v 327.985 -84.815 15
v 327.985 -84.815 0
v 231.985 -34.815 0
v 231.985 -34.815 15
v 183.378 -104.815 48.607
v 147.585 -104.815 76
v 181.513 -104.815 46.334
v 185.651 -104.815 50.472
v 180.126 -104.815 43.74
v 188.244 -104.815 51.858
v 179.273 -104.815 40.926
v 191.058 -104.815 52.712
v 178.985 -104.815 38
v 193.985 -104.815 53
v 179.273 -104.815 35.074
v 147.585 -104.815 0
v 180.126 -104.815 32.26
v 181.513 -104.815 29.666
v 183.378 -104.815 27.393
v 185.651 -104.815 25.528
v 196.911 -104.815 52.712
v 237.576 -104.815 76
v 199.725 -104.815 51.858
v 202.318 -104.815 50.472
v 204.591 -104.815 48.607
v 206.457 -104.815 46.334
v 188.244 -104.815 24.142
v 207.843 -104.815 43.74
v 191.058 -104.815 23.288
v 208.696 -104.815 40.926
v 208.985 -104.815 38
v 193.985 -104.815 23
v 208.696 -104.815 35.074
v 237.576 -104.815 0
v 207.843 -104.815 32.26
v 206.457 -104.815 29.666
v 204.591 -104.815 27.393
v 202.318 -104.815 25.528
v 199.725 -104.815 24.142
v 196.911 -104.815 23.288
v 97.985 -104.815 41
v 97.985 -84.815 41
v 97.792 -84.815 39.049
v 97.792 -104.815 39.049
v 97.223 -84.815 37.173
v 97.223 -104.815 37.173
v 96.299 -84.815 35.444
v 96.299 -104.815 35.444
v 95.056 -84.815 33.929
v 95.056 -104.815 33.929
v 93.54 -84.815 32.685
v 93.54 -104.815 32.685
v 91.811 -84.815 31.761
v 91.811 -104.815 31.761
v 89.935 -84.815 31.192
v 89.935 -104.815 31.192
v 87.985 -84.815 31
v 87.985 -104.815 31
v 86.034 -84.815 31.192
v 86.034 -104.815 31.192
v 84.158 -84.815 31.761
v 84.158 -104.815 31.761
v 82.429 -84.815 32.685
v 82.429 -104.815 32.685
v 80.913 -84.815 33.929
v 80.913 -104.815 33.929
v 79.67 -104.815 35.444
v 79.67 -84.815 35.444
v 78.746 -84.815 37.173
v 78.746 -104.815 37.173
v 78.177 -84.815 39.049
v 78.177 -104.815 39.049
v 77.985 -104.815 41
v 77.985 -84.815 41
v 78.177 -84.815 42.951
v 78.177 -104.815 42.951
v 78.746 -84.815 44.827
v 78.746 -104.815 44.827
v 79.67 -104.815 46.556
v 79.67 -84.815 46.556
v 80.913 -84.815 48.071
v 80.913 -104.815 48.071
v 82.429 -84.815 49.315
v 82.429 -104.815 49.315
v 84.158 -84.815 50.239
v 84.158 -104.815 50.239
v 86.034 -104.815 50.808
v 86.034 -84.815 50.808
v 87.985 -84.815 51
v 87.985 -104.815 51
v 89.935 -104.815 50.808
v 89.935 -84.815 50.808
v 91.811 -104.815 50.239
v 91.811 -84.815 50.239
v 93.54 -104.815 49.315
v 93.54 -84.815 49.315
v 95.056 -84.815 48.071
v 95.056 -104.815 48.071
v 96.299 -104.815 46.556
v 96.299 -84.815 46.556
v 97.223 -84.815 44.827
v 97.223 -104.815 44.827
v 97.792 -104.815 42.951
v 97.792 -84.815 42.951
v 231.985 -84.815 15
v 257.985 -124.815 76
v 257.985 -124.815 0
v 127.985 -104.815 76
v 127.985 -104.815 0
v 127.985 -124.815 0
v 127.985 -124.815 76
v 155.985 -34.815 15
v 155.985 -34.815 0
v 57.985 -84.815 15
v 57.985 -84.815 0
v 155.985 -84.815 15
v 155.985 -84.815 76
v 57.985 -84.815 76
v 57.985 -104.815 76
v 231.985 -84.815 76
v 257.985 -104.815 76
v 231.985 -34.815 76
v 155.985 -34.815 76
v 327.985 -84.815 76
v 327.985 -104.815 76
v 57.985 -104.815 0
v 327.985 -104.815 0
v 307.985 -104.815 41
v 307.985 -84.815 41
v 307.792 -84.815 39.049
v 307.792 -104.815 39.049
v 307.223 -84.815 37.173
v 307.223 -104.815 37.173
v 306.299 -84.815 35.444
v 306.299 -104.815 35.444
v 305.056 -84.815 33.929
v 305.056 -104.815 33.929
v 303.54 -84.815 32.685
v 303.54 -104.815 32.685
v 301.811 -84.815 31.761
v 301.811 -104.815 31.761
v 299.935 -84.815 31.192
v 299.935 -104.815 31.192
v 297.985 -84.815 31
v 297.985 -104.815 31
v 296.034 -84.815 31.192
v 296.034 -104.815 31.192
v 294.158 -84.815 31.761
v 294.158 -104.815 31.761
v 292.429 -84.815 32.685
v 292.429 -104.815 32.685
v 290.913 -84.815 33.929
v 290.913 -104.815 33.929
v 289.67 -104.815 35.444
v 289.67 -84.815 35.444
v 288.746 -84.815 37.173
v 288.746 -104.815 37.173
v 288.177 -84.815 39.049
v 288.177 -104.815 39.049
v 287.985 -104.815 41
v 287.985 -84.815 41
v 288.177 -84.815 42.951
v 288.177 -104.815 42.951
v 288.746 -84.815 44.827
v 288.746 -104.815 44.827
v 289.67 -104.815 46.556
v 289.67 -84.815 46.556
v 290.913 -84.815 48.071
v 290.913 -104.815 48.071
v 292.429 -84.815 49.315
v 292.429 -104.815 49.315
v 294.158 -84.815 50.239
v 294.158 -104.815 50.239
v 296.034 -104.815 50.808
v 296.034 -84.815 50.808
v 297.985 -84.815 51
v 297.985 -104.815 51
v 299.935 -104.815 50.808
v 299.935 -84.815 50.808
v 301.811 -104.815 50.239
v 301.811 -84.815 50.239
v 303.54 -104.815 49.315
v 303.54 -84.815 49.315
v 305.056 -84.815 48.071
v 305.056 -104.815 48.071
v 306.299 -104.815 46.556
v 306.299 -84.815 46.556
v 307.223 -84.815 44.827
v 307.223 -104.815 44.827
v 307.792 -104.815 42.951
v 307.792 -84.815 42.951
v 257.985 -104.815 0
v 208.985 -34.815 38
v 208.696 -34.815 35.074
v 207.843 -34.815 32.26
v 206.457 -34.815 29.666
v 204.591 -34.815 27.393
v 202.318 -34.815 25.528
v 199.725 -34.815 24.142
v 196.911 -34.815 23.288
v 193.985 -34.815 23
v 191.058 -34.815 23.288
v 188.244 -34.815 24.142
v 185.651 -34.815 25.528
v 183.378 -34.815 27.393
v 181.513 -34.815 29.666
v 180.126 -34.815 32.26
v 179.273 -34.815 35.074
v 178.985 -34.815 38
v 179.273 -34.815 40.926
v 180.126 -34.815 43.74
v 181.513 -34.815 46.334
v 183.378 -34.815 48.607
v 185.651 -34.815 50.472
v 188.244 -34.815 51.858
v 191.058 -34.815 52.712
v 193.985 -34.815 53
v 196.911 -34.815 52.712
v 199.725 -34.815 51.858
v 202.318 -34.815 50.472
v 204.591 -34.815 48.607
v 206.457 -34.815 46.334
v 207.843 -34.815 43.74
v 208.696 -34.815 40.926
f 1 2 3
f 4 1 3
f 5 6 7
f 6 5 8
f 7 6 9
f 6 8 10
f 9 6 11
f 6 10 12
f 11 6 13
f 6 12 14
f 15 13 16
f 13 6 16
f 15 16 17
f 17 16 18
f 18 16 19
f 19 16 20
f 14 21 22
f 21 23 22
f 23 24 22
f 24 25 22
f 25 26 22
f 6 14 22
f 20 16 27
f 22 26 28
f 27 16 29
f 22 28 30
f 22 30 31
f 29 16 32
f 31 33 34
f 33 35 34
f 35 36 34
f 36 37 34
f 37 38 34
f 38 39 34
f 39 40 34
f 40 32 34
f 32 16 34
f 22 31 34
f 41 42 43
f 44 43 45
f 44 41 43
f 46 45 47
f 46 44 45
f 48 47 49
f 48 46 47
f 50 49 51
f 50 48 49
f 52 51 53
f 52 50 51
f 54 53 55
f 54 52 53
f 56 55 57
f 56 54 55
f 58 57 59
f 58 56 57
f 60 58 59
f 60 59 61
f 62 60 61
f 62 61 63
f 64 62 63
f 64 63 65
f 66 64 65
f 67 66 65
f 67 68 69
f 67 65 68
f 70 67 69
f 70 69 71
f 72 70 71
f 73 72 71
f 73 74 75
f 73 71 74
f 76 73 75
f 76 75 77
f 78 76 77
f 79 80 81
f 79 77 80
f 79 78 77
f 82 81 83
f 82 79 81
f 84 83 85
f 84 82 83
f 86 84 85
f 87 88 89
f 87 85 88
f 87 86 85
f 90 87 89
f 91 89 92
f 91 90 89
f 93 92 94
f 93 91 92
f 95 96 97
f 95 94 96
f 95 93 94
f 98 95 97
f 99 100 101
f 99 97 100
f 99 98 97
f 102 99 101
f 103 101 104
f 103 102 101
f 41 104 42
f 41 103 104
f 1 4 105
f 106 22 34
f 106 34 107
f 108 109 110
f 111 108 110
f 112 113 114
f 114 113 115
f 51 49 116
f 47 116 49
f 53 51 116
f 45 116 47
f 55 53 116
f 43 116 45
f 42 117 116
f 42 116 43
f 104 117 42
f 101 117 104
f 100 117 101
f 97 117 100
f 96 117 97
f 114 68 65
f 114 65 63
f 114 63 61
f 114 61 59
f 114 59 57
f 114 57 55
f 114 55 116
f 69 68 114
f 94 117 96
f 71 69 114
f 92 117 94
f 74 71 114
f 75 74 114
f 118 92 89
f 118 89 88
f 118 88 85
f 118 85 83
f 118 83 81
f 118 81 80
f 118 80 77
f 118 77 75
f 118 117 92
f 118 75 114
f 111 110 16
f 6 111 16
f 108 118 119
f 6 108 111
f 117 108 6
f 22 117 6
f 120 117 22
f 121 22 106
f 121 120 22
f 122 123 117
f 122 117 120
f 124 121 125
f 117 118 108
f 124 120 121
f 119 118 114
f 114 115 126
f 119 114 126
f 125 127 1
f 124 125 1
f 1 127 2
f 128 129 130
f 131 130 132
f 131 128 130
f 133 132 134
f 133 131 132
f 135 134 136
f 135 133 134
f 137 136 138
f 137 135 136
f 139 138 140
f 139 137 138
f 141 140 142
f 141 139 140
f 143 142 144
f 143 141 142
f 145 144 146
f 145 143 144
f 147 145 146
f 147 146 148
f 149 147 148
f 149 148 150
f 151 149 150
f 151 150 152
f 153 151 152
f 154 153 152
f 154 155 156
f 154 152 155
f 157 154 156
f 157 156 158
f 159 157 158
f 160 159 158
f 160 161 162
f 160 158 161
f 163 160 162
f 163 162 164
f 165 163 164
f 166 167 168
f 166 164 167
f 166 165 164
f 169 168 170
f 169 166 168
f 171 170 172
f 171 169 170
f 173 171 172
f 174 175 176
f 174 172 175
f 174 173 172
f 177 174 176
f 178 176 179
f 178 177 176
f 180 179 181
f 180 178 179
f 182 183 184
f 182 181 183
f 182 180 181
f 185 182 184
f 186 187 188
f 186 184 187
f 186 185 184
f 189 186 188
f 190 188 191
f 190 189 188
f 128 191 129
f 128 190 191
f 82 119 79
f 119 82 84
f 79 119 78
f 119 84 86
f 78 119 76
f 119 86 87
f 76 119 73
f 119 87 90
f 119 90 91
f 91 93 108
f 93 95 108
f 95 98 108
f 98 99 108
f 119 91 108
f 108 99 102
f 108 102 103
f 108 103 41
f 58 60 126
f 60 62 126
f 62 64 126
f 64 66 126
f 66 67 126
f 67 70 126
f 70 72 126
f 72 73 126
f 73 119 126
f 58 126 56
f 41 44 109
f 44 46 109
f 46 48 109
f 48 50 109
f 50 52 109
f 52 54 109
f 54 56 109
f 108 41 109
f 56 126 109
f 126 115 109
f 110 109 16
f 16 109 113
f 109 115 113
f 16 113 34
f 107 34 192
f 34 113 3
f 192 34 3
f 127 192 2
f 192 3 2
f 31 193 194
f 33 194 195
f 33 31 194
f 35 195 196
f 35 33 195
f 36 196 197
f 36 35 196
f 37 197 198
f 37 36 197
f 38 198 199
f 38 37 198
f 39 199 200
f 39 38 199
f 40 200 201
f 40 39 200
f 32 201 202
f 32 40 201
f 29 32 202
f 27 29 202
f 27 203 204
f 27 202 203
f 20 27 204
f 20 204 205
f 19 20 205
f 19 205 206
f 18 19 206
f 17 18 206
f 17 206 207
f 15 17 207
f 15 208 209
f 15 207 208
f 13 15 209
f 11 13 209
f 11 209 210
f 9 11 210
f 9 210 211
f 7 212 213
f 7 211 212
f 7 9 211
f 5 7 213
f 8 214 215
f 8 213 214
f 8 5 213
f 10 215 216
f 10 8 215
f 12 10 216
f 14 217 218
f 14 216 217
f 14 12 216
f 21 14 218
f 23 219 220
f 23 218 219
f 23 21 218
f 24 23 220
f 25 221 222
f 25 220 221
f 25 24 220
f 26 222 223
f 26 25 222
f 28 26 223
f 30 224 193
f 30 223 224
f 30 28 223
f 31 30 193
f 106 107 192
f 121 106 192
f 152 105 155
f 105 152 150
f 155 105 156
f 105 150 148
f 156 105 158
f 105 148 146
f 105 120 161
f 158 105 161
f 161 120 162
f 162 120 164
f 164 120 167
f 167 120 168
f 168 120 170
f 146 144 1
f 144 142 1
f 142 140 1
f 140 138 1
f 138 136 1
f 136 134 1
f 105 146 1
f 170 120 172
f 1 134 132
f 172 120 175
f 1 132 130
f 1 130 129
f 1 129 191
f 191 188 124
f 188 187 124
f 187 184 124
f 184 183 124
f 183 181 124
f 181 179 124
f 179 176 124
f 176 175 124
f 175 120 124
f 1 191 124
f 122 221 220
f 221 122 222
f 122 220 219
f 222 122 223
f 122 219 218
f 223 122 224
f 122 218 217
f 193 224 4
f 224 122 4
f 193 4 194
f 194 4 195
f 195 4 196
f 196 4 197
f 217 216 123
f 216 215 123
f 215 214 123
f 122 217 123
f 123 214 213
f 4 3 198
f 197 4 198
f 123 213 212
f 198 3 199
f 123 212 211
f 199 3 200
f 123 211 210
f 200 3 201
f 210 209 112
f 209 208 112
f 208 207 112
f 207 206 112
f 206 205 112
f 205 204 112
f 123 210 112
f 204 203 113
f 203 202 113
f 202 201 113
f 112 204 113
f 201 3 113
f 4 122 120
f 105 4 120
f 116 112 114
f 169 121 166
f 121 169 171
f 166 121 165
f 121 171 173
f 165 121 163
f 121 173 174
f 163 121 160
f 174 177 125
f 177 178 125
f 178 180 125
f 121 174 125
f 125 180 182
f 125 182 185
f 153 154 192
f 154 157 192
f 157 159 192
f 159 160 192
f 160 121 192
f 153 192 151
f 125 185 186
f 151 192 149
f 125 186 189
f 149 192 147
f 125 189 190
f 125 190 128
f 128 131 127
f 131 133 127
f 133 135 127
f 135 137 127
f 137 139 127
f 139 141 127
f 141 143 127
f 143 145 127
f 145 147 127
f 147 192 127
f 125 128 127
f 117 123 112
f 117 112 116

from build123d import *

# Parameters (mm, degrees)
BOSS_EXTRUDE1_DEPTH = 76
CUT_EXTRUDE1_DEPTH  = 61
SKETCH7_R           = 15
SKETCH7_R_2         = 10
CUT_EXTRUDE4_DEPTH  = 71


with BuildPart() as part:
    # Sketch2 → Boss-Extrude1 (new body)
    with BuildSketch(Plane.XY):
        Polygon((155.98455698, -34.815353078), (57.98455698, -84.815353078), (57.98455698, -104.815353078), (127.98455698, -104.815353078), (127.98455698, -124.815353078), (147.58455698, -104.815353078), (237.576393715, -104.815353078), (257.98455698, -124.815353078), (257.98455698, -104.815353078), (327.98455698, -104.815353078), (327.98455698, -84.815353078), (231.98455698, -34.815353078), align=None)
    extrude(amount=BOSS_EXTRUDE1_DEPTH)

    # Sketch5 → Cut-Extrude1 (cut)
    with BuildSketch(Plane.XY.offset(76)):
        Polygon((155.98455698, -34.815353078), (155.98455698, -84.815353078), (57.98455698, -84.815353078), align=None)
        Polygon((231.98455698, -34.815353078), (231.98455698, -84.815353078), (327.98455698, -84.815353078), align=None)
    extrude(amount=-CUT_EXTRUDE1_DEPTH, mode=Mode.SUBTRACT)

    # Sketch7 → Cut-Extrude4 (cut, through all)
    with BuildSketch(Plane(origin=(0, -104.815353078, 0), x_dir=(1, 0, 0), z_dir=(0, 1, 0))):
        with Locations((193.98455698, -38)):
            Circle(SKETCH7_R)
        with Locations((87.98455698, -41)):
            Circle(SKETCH7_R_2)
        with Locations((297.98455698, -41)):
            Circle(SKETCH7_R_2)
    extrude(amount=CUT_EXTRUDE4_DEPTH, mode=Mode.SUBTRACT)


solid = part.part
